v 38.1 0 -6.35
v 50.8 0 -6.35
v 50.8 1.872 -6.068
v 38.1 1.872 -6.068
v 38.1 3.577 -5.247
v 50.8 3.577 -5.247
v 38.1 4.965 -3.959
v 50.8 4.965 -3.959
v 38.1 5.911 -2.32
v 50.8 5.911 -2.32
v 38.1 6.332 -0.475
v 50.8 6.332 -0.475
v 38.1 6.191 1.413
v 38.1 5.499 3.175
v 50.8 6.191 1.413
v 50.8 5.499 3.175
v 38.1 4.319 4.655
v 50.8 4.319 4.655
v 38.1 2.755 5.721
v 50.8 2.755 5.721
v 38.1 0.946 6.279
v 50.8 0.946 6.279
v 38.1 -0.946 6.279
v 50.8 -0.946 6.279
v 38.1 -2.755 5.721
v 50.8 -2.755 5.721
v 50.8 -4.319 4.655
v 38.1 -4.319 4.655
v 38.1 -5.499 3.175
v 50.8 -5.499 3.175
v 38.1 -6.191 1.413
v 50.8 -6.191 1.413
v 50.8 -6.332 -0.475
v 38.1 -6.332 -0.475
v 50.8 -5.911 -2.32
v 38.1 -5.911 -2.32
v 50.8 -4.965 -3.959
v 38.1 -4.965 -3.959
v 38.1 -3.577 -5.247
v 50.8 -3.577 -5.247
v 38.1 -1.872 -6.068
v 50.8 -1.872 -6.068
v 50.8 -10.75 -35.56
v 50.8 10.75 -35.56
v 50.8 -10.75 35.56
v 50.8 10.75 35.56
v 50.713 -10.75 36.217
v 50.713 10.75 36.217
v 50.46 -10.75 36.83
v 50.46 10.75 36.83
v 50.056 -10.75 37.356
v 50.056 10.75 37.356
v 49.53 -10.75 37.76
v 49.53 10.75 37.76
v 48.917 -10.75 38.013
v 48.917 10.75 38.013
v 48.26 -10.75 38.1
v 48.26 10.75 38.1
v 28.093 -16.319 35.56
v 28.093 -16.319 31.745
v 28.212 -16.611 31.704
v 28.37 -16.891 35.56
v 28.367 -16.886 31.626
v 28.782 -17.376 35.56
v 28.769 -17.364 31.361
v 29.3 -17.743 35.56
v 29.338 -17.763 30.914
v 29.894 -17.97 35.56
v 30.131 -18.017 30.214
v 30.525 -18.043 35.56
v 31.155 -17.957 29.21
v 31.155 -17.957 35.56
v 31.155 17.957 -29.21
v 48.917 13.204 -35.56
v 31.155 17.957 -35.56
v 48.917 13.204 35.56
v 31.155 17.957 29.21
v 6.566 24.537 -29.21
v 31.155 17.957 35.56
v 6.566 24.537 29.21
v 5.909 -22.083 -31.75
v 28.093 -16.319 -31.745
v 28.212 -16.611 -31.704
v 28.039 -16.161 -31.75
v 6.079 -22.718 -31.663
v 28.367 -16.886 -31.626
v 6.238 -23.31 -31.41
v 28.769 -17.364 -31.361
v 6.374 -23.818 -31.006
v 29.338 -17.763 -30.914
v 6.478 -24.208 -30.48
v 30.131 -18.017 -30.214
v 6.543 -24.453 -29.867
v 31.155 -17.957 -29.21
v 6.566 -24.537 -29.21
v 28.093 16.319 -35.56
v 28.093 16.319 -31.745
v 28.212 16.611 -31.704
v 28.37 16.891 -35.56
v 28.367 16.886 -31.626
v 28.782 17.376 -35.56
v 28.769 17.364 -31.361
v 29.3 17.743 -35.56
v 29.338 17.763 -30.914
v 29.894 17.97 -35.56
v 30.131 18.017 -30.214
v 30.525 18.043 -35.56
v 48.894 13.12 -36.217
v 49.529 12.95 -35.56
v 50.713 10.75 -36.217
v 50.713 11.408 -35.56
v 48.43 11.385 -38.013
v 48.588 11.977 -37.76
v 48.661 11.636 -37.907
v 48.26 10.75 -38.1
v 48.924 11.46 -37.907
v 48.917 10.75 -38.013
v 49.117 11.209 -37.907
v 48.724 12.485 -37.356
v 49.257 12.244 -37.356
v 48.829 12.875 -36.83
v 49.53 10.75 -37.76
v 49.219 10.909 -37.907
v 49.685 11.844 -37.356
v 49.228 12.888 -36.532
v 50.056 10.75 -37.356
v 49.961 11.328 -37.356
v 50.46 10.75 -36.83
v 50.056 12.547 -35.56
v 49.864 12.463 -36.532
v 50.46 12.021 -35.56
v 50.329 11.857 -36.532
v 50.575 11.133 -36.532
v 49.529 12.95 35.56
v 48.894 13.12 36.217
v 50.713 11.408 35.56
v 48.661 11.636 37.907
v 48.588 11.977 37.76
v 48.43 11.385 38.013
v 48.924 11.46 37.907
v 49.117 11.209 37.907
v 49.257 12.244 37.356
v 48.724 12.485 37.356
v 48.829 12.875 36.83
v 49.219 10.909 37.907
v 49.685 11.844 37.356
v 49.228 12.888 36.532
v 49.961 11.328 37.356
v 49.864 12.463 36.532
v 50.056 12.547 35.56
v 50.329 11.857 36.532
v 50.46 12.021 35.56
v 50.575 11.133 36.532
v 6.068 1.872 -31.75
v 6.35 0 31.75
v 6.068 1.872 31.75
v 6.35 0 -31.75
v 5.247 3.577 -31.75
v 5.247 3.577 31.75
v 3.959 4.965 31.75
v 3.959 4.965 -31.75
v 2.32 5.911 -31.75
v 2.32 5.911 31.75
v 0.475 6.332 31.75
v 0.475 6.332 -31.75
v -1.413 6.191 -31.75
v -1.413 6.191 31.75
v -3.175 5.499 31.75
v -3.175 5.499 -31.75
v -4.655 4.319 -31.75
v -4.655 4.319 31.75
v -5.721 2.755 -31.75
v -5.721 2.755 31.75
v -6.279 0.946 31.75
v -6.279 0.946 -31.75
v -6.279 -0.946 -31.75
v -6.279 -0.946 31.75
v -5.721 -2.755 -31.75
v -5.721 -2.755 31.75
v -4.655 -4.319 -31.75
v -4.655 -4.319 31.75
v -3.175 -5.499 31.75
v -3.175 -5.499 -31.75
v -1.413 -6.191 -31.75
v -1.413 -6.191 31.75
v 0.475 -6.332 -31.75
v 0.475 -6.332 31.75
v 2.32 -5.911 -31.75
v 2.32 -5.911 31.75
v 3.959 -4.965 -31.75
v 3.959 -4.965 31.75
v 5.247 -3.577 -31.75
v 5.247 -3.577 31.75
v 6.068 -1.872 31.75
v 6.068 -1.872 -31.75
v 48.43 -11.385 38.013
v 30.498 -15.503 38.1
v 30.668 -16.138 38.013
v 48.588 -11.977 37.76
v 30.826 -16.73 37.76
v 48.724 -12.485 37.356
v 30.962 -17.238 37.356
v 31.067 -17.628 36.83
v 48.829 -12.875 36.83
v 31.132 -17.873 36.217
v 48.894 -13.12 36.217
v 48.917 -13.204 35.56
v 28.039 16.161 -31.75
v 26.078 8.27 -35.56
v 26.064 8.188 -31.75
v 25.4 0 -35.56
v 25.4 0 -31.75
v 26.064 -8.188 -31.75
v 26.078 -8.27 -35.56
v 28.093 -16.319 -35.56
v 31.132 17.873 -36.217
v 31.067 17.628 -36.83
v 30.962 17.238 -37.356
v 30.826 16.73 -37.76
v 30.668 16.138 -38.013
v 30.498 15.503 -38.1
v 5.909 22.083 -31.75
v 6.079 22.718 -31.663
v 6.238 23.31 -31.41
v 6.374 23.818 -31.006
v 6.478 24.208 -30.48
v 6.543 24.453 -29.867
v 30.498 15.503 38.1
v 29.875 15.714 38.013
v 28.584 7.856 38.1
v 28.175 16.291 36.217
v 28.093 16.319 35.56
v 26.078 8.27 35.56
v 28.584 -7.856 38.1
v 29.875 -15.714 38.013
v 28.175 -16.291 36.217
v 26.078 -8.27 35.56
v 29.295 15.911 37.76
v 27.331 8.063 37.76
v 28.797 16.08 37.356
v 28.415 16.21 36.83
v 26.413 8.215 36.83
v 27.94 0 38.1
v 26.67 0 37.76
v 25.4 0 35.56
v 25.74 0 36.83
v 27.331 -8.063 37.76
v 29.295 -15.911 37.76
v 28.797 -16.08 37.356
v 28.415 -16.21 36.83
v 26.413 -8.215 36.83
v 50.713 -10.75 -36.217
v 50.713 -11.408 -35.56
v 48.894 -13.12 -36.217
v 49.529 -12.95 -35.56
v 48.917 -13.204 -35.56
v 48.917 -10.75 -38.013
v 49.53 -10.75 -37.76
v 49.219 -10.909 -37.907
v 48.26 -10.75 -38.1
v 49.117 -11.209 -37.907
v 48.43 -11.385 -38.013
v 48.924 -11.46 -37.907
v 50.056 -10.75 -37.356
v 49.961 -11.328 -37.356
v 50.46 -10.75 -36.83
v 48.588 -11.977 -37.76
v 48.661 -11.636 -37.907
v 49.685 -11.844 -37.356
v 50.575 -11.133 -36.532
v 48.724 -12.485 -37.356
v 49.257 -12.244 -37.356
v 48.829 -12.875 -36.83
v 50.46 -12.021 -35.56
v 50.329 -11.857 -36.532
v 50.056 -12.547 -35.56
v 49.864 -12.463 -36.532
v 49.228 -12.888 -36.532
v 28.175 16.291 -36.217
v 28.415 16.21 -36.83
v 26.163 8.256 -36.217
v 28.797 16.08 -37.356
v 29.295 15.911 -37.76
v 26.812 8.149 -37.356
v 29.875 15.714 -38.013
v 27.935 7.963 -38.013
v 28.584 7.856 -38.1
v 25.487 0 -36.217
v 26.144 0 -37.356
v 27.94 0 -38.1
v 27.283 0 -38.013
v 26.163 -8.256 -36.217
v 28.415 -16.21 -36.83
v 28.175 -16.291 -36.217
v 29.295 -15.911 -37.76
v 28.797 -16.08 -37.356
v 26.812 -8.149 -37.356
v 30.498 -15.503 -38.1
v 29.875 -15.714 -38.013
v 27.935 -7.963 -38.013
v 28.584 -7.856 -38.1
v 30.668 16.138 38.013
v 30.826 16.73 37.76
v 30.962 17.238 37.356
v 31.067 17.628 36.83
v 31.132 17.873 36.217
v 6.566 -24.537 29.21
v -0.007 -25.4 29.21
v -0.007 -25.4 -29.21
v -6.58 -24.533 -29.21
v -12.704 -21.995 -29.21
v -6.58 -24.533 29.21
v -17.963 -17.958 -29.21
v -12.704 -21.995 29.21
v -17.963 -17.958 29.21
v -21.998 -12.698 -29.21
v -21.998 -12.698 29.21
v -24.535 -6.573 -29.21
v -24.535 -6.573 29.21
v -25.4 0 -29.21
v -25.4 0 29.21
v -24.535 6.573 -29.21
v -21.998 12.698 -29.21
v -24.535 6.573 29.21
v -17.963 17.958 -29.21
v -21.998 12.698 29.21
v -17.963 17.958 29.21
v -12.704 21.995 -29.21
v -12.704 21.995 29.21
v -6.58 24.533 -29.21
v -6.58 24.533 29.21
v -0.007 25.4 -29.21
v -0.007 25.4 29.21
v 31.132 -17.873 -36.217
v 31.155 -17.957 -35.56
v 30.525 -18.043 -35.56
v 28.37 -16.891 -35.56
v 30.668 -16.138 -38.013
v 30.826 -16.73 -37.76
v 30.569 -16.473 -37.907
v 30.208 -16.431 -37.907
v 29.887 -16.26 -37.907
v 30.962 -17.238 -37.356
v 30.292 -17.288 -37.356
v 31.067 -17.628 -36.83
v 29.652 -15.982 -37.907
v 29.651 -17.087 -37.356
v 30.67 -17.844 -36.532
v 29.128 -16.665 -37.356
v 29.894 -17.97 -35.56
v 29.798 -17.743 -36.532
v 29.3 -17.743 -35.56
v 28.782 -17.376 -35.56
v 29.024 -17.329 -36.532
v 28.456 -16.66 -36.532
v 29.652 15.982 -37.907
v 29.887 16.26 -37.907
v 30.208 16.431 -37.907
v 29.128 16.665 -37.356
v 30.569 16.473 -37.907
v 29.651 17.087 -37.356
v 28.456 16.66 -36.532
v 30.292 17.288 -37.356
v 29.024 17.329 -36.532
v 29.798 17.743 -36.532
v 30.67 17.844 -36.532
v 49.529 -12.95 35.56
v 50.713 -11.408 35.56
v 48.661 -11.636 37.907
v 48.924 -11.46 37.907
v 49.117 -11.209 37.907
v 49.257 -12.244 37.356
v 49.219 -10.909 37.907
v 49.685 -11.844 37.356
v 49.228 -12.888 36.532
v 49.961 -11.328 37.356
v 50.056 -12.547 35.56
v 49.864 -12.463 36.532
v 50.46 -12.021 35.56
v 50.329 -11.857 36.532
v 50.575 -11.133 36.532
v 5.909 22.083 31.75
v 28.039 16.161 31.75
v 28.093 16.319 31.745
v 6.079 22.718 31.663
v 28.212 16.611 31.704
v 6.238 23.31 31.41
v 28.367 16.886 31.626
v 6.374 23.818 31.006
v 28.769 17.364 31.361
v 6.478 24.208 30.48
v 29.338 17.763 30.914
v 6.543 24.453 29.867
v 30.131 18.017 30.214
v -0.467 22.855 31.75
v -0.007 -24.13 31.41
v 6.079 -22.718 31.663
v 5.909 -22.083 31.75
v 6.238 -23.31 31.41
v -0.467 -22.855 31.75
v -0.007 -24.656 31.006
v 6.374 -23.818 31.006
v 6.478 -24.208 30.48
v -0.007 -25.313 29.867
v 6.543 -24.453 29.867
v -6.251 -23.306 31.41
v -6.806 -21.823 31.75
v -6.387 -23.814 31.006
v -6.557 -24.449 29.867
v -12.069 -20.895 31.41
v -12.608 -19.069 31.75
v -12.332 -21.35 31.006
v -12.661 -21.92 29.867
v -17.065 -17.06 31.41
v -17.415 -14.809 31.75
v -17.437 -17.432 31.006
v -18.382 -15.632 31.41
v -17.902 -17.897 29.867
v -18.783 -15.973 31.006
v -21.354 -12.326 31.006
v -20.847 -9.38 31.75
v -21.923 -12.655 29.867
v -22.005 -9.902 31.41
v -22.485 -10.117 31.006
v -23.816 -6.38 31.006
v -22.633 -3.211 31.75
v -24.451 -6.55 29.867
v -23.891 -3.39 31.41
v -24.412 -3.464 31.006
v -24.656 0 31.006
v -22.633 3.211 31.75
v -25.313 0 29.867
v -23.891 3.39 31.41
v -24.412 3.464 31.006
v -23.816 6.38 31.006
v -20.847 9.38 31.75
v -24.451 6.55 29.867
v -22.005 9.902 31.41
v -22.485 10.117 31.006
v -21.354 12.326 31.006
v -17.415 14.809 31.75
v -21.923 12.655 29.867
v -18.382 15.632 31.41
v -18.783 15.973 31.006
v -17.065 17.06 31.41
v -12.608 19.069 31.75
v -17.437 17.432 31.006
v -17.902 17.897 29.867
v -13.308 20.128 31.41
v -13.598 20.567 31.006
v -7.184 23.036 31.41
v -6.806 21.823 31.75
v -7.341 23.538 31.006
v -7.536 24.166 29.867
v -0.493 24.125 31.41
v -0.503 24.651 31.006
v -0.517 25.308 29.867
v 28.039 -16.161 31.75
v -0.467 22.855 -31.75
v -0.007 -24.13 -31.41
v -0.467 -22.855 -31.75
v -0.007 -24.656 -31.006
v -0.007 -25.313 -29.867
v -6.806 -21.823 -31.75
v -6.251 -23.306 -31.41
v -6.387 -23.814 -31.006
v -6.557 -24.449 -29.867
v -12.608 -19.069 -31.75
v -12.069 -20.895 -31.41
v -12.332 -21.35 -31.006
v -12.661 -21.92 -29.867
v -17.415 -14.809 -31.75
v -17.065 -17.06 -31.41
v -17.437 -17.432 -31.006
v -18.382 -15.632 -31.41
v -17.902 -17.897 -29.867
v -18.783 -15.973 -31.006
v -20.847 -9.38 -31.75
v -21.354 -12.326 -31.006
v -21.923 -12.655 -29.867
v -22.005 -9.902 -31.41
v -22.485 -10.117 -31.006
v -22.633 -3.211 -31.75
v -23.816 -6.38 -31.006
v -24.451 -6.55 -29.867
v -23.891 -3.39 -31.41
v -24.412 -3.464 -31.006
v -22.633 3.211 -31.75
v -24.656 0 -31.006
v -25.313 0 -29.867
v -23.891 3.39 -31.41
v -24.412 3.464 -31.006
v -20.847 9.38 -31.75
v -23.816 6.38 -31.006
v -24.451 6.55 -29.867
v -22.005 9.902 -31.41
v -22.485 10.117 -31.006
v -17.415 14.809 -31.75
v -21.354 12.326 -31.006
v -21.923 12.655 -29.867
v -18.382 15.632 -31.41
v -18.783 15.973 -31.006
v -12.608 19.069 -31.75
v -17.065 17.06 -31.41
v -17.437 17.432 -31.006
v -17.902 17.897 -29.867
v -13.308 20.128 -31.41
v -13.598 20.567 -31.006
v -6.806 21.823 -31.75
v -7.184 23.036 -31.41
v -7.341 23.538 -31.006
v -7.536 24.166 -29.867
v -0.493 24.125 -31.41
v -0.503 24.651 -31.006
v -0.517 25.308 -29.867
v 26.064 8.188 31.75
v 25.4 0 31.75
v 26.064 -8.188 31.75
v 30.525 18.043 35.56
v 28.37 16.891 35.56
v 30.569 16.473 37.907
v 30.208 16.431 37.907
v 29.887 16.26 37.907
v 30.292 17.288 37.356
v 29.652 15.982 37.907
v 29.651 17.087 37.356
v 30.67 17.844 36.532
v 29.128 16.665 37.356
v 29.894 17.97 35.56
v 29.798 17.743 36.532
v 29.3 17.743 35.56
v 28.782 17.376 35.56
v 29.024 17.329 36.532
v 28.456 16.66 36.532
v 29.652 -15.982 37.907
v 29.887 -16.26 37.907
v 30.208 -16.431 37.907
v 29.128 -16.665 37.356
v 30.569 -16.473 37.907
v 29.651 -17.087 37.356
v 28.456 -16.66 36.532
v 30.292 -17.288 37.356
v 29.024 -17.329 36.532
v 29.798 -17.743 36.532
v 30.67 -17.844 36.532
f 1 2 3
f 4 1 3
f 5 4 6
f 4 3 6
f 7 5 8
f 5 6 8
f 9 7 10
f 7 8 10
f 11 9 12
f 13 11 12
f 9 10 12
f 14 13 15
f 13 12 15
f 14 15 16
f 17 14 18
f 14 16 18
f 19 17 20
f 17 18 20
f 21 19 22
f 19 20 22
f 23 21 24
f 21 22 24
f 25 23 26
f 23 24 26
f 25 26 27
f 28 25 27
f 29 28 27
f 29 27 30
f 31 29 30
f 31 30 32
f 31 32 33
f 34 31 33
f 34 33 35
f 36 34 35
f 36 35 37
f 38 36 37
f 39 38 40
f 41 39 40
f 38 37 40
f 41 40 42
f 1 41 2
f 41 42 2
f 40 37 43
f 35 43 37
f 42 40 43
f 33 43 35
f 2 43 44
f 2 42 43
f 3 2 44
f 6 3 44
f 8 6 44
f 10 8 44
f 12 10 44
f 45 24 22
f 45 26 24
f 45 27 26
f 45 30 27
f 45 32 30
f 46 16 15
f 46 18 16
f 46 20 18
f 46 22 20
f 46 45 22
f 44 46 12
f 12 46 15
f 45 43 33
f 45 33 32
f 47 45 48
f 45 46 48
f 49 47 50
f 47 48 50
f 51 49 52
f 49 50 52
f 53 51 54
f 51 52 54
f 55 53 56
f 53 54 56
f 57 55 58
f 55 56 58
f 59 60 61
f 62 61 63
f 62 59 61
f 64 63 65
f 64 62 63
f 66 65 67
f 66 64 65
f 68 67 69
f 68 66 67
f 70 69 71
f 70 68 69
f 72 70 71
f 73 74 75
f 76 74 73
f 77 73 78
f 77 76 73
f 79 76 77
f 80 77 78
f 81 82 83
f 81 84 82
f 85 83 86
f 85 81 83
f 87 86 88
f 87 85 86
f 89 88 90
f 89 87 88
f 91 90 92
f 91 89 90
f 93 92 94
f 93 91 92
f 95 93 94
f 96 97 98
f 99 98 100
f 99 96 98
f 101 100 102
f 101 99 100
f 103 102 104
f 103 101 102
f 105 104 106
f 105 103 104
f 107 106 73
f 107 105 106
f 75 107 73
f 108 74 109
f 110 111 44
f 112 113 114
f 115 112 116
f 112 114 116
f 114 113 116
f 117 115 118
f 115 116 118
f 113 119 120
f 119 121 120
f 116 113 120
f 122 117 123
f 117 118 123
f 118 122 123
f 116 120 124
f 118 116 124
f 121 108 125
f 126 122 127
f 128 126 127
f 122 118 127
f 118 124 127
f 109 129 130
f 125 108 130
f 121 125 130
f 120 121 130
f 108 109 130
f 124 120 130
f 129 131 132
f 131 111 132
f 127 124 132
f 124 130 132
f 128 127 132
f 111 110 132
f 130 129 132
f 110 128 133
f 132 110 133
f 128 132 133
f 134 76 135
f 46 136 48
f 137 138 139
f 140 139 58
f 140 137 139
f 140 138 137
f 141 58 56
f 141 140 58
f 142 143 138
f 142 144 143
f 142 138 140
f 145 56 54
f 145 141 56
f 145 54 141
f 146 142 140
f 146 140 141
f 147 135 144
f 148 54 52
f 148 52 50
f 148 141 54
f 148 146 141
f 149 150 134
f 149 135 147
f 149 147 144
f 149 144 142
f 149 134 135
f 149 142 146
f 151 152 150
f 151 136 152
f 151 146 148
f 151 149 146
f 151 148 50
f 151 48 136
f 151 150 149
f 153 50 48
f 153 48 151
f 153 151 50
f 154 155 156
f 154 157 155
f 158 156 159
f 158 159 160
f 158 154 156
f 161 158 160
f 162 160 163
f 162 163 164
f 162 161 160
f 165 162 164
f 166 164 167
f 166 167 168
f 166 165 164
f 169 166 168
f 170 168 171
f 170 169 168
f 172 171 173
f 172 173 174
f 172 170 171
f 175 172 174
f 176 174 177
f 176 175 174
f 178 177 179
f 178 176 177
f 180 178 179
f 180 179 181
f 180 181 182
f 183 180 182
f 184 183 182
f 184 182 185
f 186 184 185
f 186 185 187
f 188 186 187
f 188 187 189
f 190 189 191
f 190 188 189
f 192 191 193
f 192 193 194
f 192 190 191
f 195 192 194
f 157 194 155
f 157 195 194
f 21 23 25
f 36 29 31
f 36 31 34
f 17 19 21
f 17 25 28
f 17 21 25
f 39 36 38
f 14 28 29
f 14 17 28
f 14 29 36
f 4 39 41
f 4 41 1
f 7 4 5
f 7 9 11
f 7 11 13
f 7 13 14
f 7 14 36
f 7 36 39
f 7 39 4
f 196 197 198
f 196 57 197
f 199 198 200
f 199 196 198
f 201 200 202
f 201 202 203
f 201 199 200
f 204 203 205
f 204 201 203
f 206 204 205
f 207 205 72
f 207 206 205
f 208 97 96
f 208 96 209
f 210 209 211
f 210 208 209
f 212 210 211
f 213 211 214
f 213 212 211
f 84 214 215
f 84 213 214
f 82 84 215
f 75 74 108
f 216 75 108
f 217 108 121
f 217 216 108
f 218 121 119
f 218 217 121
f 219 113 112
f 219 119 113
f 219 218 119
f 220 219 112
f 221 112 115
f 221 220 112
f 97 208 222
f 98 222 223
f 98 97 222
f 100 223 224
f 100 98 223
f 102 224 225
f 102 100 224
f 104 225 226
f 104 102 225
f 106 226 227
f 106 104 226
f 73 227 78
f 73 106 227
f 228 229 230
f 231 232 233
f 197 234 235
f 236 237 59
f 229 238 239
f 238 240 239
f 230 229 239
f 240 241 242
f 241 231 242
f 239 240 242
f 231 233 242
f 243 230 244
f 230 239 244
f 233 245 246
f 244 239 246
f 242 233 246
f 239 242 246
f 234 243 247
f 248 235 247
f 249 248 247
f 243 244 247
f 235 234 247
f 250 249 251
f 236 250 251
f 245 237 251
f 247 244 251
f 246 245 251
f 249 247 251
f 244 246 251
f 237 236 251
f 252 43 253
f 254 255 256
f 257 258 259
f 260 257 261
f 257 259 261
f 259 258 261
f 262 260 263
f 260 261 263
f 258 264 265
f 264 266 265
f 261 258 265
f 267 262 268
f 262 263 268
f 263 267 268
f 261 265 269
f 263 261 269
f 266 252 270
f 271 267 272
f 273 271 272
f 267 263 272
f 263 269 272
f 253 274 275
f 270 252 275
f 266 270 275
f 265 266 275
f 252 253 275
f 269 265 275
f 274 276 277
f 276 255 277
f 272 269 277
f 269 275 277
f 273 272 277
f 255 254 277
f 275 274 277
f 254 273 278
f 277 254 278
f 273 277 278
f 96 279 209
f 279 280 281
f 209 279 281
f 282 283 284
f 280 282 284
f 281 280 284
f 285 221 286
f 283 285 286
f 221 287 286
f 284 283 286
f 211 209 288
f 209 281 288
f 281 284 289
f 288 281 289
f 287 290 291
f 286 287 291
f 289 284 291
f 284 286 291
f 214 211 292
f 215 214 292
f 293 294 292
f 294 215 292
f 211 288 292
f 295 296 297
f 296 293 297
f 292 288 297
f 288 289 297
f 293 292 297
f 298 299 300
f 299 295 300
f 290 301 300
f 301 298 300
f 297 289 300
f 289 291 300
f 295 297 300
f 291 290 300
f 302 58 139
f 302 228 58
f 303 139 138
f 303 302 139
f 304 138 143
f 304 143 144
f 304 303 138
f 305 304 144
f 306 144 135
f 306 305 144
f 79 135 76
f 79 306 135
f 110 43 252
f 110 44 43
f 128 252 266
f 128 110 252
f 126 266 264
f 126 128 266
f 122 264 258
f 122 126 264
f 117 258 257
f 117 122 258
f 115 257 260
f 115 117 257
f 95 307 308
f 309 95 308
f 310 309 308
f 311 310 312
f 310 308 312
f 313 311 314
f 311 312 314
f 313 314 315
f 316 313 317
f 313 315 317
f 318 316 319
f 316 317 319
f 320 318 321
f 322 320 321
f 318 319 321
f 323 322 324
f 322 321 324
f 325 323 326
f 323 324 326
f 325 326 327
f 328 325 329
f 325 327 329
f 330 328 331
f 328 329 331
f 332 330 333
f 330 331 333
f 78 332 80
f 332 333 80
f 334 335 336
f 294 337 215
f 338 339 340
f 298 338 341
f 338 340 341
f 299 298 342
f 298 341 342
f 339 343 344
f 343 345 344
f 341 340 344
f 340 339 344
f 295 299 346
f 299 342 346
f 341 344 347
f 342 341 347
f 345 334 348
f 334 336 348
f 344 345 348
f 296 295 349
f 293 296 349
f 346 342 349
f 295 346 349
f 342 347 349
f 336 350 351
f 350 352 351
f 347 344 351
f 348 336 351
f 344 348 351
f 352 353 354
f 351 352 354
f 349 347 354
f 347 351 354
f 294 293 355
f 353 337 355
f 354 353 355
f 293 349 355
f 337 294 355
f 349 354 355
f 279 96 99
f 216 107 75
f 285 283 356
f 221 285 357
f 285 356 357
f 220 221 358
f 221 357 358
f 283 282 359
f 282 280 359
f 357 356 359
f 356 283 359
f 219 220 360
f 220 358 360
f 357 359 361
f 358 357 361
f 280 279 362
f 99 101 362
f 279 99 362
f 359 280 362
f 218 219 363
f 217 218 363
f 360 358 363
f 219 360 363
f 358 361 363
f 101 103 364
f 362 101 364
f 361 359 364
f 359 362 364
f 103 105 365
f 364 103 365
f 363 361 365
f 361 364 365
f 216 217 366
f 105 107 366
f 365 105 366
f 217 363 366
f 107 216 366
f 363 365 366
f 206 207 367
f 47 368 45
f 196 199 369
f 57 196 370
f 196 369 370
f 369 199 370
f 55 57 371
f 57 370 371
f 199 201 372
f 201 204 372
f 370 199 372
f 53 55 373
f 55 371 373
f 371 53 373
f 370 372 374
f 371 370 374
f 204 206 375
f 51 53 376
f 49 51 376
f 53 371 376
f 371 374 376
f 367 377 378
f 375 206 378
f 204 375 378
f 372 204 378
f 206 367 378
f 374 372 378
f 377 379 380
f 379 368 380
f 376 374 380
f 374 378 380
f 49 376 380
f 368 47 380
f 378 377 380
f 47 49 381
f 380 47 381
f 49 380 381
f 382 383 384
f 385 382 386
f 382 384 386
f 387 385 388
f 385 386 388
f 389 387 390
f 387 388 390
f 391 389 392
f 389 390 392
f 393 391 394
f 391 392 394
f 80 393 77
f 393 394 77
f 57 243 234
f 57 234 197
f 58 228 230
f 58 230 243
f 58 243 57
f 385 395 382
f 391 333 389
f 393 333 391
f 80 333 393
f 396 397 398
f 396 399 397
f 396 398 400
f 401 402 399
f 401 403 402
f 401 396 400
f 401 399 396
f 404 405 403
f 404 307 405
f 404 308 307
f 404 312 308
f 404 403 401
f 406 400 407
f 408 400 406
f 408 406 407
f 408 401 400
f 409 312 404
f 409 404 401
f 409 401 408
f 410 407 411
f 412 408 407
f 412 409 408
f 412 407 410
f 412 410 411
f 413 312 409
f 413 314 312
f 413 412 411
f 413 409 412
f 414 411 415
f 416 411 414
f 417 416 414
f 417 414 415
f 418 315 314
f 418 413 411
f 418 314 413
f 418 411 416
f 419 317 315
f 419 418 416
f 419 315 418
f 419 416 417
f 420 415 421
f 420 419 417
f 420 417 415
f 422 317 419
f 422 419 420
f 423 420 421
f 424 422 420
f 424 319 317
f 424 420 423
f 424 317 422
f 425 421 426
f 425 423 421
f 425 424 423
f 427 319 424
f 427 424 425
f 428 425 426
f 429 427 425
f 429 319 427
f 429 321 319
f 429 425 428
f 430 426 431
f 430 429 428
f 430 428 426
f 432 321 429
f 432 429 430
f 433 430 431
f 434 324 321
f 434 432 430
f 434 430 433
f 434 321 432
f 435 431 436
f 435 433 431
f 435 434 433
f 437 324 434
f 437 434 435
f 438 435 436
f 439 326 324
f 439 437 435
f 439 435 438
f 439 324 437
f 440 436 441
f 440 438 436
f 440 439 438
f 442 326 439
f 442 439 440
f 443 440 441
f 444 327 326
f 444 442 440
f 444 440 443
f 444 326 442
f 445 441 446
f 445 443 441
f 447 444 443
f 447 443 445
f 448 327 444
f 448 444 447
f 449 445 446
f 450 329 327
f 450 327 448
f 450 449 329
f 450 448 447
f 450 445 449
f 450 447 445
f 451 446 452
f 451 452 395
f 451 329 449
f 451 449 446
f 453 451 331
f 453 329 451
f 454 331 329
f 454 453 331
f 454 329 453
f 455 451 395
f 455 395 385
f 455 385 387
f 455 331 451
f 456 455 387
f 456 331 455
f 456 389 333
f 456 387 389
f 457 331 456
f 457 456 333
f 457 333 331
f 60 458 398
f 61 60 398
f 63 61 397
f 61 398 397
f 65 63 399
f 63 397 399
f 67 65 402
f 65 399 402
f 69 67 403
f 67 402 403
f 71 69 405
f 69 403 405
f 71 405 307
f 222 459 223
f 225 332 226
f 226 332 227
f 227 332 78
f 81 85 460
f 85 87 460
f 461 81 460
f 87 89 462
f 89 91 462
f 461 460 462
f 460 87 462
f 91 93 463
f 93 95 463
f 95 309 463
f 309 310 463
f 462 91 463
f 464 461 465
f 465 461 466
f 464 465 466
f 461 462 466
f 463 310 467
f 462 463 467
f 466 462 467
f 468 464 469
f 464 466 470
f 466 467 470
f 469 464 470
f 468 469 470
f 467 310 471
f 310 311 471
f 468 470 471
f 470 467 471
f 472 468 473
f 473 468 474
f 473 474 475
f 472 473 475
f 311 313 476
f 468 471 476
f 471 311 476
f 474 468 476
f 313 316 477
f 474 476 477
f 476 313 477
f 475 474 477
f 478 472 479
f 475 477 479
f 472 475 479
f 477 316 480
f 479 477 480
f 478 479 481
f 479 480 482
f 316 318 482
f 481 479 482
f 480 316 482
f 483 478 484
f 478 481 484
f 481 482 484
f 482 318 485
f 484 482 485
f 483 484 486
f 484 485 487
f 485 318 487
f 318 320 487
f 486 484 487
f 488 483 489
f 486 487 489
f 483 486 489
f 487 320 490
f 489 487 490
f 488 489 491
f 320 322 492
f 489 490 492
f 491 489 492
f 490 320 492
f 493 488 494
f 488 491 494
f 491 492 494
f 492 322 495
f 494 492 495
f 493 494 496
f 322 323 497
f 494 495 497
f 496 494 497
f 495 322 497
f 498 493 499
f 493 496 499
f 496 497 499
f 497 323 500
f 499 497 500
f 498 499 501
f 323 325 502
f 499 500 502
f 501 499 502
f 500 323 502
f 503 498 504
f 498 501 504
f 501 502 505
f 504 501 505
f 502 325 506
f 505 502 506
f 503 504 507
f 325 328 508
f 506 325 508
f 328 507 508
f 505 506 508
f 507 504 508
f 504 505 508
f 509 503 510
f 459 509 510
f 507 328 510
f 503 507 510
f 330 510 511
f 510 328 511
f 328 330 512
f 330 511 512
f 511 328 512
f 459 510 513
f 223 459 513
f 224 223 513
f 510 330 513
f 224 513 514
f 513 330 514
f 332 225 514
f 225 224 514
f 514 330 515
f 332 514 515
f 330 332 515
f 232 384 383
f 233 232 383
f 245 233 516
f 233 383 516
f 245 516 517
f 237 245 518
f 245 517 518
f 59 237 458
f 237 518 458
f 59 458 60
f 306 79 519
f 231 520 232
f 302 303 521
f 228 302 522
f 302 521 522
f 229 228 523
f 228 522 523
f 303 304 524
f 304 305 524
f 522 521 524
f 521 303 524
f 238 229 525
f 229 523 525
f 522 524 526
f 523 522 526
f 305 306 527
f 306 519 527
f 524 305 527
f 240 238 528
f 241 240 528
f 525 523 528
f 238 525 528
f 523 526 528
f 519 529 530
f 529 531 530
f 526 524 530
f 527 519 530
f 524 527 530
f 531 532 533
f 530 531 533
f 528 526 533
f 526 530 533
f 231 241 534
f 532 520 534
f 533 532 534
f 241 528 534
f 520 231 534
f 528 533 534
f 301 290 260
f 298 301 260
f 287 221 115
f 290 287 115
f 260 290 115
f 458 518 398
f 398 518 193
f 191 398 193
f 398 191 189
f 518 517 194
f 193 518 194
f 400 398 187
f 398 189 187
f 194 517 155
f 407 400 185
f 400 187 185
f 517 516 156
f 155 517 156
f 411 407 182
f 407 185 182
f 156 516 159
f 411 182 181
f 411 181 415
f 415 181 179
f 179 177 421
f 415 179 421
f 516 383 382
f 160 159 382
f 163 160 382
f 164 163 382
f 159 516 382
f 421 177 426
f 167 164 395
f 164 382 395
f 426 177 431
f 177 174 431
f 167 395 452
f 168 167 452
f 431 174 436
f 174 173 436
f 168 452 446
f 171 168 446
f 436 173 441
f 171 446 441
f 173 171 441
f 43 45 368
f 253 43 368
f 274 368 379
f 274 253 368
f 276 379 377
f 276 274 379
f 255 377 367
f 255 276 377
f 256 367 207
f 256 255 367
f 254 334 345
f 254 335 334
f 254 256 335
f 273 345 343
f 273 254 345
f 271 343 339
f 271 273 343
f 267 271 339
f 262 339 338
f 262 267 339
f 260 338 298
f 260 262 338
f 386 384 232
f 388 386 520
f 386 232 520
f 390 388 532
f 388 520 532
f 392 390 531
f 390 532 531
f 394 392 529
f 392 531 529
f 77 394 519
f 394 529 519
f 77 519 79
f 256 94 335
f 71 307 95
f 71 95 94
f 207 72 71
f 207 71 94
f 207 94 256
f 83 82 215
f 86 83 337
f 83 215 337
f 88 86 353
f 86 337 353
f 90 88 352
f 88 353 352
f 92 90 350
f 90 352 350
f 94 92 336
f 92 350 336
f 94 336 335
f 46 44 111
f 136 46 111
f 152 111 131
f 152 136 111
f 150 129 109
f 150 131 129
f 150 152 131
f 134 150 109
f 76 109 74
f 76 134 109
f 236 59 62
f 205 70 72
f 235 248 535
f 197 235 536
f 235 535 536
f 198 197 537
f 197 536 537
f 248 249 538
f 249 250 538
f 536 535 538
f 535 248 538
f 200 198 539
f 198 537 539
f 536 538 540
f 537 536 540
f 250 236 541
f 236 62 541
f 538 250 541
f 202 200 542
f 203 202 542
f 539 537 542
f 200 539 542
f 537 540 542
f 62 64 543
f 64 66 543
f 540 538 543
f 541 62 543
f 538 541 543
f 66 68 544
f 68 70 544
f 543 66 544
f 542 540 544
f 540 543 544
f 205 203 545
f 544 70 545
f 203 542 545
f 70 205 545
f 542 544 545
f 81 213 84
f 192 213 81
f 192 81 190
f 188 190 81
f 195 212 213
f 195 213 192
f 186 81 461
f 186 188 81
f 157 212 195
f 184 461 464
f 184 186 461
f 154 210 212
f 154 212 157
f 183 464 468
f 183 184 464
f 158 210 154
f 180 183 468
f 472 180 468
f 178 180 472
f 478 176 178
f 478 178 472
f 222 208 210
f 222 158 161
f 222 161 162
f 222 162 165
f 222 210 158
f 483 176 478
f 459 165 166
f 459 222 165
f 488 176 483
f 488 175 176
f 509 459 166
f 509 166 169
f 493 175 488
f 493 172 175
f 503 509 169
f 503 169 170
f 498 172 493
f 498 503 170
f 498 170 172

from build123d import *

# Parameters (mm, degrees)
SKETCH1_R           = 6.35
BOSS_EXTRUDE1_DEPTH = 31.75
BOSS_EXTRUDE2_DEPTH = 6.35
SKETCH3_R           = 6.35
CUT_EXTRUDE1_DEPTH  = 12.7
FILLET1_R           = 2.54


with BuildPart() as part:
    # Sketch1 → Boss-Extrude1 (new body)
    with BuildSketch(Plane.XY):
        with BuildLine():
            Line((6.565823388424392, 24.536706446302436), (50.800000000000004, 12.699999999999978))
            Line((50.800000000000004, 12.699999999999978), (50.800000000000004, -12.70000000000002))
            Line((50.800000000000004, -12.70000000000002), (6.565823388424392, -24.536706446302436))
            ThreePointArc((6.565823388424392, -24.536706446302436), (-25.400000000000006, 3.11e-15), (6.565823388424392, 24.536706446302436))
        make_face()
        Circle(SKETCH1_R, mode=Mode.SUBTRACT)
    boss_extrude1 = extrude(amount=BOSS_EXTRUDE1_DEPTH)

    # Sketch2 → Boss-Extrude2 (add)
    with BuildSketch(Plane.XY.offset(31.75)):
        with BuildLine():
            Line((50.80000000000001, -12.700000000000014), (50.800000000000004, 12.699999999999978))
            Line((50.800000000000004, 12.699999999999978), (28.910843041272116, 18.557360645652828))
            ThreePointArc((28.910843041272116, 18.557360645652825), (26.285427110394792, 9.443273439243344), (25.399999999999693, 0))
            ThreePointArc((25.399999999999693, 0), (26.285427110394785, -9.443273439243356), (28.910843041272116, -18.557360645652846))
            Line((28.910843041272113, -18.557360645652846), (50.80000000000001, -12.700000000000015))
        make_face()
    boss_extrude2 = extrude(amount=BOSS_EXTRUDE2_DEPTH)

    # Mirror1: Boss-Extrude1, Boss-Extrude2 across plane
    add(boss_extrude1.mirror(Plane.XY))
    add(boss_extrude2.mirror(Plane.XY))

    # Sketch3 → Cut-Extrude1 (cut)
    with BuildSketch(Plane(origin=(50.800000000000004, 0, 0), x_dir=(0, 0, -1), z_dir=(1, 0, 0))):
        Circle(SKETCH3_R)
    extrude(amount=-CUT_EXTRUDE1_DEPTH, mode=Mode.SUBTRACT)

    # Fillet1
    fillet1_edges = [part.edges().sort_by_distance(p)[0] for p in [
        (50.800000000000004, 12.699999999999978, 0),
        (50.80000000000001, -12.700000000000014, 0),
        (17.738333214848257, 21.54703354597763, 31.75),
        (-25.40000000000001, 5.33e-15, 31.75),
        (28.910843041272116, 18.557360645652828, 34.925),
        (28.910843041272116, -18.557360645652842, 34.925),
        (39.85542152063606, 15.628680322826403, 38.1),
        (25.3999999999997, -8.88e-15, 38.1),
        (39.855421520636064, -15.62868032282643, 38.1),
        (17.738333214848254, -21.54703354597764, 31.75),
        (50.80000000000001, -1.776e-14, 38.1),
        (17.738333214848254, -21.54703354597764, -31.75),
        (-25.40000000000001, 5.33e-15, -31.75),
        (17.738333214848257, 21.54703354597763, -31.75),
        (39.85542152063606, 15.628680322826403, -38.1),
        (28.910843041272116, 18.557360645652828, -34.925),
        (50.80000000000001, -1.776e-14, -38.1),
        (39.855421520636064, -15.62868032282643, -38.1),
        (25.3999999999997, -8.88e-15, -38.1),
        (28.910843041272116, -18.557360645652842, -34.925),
    ]]
    fillet(fillet1_edges, radius=FILLET1_R)


solid = part.part
